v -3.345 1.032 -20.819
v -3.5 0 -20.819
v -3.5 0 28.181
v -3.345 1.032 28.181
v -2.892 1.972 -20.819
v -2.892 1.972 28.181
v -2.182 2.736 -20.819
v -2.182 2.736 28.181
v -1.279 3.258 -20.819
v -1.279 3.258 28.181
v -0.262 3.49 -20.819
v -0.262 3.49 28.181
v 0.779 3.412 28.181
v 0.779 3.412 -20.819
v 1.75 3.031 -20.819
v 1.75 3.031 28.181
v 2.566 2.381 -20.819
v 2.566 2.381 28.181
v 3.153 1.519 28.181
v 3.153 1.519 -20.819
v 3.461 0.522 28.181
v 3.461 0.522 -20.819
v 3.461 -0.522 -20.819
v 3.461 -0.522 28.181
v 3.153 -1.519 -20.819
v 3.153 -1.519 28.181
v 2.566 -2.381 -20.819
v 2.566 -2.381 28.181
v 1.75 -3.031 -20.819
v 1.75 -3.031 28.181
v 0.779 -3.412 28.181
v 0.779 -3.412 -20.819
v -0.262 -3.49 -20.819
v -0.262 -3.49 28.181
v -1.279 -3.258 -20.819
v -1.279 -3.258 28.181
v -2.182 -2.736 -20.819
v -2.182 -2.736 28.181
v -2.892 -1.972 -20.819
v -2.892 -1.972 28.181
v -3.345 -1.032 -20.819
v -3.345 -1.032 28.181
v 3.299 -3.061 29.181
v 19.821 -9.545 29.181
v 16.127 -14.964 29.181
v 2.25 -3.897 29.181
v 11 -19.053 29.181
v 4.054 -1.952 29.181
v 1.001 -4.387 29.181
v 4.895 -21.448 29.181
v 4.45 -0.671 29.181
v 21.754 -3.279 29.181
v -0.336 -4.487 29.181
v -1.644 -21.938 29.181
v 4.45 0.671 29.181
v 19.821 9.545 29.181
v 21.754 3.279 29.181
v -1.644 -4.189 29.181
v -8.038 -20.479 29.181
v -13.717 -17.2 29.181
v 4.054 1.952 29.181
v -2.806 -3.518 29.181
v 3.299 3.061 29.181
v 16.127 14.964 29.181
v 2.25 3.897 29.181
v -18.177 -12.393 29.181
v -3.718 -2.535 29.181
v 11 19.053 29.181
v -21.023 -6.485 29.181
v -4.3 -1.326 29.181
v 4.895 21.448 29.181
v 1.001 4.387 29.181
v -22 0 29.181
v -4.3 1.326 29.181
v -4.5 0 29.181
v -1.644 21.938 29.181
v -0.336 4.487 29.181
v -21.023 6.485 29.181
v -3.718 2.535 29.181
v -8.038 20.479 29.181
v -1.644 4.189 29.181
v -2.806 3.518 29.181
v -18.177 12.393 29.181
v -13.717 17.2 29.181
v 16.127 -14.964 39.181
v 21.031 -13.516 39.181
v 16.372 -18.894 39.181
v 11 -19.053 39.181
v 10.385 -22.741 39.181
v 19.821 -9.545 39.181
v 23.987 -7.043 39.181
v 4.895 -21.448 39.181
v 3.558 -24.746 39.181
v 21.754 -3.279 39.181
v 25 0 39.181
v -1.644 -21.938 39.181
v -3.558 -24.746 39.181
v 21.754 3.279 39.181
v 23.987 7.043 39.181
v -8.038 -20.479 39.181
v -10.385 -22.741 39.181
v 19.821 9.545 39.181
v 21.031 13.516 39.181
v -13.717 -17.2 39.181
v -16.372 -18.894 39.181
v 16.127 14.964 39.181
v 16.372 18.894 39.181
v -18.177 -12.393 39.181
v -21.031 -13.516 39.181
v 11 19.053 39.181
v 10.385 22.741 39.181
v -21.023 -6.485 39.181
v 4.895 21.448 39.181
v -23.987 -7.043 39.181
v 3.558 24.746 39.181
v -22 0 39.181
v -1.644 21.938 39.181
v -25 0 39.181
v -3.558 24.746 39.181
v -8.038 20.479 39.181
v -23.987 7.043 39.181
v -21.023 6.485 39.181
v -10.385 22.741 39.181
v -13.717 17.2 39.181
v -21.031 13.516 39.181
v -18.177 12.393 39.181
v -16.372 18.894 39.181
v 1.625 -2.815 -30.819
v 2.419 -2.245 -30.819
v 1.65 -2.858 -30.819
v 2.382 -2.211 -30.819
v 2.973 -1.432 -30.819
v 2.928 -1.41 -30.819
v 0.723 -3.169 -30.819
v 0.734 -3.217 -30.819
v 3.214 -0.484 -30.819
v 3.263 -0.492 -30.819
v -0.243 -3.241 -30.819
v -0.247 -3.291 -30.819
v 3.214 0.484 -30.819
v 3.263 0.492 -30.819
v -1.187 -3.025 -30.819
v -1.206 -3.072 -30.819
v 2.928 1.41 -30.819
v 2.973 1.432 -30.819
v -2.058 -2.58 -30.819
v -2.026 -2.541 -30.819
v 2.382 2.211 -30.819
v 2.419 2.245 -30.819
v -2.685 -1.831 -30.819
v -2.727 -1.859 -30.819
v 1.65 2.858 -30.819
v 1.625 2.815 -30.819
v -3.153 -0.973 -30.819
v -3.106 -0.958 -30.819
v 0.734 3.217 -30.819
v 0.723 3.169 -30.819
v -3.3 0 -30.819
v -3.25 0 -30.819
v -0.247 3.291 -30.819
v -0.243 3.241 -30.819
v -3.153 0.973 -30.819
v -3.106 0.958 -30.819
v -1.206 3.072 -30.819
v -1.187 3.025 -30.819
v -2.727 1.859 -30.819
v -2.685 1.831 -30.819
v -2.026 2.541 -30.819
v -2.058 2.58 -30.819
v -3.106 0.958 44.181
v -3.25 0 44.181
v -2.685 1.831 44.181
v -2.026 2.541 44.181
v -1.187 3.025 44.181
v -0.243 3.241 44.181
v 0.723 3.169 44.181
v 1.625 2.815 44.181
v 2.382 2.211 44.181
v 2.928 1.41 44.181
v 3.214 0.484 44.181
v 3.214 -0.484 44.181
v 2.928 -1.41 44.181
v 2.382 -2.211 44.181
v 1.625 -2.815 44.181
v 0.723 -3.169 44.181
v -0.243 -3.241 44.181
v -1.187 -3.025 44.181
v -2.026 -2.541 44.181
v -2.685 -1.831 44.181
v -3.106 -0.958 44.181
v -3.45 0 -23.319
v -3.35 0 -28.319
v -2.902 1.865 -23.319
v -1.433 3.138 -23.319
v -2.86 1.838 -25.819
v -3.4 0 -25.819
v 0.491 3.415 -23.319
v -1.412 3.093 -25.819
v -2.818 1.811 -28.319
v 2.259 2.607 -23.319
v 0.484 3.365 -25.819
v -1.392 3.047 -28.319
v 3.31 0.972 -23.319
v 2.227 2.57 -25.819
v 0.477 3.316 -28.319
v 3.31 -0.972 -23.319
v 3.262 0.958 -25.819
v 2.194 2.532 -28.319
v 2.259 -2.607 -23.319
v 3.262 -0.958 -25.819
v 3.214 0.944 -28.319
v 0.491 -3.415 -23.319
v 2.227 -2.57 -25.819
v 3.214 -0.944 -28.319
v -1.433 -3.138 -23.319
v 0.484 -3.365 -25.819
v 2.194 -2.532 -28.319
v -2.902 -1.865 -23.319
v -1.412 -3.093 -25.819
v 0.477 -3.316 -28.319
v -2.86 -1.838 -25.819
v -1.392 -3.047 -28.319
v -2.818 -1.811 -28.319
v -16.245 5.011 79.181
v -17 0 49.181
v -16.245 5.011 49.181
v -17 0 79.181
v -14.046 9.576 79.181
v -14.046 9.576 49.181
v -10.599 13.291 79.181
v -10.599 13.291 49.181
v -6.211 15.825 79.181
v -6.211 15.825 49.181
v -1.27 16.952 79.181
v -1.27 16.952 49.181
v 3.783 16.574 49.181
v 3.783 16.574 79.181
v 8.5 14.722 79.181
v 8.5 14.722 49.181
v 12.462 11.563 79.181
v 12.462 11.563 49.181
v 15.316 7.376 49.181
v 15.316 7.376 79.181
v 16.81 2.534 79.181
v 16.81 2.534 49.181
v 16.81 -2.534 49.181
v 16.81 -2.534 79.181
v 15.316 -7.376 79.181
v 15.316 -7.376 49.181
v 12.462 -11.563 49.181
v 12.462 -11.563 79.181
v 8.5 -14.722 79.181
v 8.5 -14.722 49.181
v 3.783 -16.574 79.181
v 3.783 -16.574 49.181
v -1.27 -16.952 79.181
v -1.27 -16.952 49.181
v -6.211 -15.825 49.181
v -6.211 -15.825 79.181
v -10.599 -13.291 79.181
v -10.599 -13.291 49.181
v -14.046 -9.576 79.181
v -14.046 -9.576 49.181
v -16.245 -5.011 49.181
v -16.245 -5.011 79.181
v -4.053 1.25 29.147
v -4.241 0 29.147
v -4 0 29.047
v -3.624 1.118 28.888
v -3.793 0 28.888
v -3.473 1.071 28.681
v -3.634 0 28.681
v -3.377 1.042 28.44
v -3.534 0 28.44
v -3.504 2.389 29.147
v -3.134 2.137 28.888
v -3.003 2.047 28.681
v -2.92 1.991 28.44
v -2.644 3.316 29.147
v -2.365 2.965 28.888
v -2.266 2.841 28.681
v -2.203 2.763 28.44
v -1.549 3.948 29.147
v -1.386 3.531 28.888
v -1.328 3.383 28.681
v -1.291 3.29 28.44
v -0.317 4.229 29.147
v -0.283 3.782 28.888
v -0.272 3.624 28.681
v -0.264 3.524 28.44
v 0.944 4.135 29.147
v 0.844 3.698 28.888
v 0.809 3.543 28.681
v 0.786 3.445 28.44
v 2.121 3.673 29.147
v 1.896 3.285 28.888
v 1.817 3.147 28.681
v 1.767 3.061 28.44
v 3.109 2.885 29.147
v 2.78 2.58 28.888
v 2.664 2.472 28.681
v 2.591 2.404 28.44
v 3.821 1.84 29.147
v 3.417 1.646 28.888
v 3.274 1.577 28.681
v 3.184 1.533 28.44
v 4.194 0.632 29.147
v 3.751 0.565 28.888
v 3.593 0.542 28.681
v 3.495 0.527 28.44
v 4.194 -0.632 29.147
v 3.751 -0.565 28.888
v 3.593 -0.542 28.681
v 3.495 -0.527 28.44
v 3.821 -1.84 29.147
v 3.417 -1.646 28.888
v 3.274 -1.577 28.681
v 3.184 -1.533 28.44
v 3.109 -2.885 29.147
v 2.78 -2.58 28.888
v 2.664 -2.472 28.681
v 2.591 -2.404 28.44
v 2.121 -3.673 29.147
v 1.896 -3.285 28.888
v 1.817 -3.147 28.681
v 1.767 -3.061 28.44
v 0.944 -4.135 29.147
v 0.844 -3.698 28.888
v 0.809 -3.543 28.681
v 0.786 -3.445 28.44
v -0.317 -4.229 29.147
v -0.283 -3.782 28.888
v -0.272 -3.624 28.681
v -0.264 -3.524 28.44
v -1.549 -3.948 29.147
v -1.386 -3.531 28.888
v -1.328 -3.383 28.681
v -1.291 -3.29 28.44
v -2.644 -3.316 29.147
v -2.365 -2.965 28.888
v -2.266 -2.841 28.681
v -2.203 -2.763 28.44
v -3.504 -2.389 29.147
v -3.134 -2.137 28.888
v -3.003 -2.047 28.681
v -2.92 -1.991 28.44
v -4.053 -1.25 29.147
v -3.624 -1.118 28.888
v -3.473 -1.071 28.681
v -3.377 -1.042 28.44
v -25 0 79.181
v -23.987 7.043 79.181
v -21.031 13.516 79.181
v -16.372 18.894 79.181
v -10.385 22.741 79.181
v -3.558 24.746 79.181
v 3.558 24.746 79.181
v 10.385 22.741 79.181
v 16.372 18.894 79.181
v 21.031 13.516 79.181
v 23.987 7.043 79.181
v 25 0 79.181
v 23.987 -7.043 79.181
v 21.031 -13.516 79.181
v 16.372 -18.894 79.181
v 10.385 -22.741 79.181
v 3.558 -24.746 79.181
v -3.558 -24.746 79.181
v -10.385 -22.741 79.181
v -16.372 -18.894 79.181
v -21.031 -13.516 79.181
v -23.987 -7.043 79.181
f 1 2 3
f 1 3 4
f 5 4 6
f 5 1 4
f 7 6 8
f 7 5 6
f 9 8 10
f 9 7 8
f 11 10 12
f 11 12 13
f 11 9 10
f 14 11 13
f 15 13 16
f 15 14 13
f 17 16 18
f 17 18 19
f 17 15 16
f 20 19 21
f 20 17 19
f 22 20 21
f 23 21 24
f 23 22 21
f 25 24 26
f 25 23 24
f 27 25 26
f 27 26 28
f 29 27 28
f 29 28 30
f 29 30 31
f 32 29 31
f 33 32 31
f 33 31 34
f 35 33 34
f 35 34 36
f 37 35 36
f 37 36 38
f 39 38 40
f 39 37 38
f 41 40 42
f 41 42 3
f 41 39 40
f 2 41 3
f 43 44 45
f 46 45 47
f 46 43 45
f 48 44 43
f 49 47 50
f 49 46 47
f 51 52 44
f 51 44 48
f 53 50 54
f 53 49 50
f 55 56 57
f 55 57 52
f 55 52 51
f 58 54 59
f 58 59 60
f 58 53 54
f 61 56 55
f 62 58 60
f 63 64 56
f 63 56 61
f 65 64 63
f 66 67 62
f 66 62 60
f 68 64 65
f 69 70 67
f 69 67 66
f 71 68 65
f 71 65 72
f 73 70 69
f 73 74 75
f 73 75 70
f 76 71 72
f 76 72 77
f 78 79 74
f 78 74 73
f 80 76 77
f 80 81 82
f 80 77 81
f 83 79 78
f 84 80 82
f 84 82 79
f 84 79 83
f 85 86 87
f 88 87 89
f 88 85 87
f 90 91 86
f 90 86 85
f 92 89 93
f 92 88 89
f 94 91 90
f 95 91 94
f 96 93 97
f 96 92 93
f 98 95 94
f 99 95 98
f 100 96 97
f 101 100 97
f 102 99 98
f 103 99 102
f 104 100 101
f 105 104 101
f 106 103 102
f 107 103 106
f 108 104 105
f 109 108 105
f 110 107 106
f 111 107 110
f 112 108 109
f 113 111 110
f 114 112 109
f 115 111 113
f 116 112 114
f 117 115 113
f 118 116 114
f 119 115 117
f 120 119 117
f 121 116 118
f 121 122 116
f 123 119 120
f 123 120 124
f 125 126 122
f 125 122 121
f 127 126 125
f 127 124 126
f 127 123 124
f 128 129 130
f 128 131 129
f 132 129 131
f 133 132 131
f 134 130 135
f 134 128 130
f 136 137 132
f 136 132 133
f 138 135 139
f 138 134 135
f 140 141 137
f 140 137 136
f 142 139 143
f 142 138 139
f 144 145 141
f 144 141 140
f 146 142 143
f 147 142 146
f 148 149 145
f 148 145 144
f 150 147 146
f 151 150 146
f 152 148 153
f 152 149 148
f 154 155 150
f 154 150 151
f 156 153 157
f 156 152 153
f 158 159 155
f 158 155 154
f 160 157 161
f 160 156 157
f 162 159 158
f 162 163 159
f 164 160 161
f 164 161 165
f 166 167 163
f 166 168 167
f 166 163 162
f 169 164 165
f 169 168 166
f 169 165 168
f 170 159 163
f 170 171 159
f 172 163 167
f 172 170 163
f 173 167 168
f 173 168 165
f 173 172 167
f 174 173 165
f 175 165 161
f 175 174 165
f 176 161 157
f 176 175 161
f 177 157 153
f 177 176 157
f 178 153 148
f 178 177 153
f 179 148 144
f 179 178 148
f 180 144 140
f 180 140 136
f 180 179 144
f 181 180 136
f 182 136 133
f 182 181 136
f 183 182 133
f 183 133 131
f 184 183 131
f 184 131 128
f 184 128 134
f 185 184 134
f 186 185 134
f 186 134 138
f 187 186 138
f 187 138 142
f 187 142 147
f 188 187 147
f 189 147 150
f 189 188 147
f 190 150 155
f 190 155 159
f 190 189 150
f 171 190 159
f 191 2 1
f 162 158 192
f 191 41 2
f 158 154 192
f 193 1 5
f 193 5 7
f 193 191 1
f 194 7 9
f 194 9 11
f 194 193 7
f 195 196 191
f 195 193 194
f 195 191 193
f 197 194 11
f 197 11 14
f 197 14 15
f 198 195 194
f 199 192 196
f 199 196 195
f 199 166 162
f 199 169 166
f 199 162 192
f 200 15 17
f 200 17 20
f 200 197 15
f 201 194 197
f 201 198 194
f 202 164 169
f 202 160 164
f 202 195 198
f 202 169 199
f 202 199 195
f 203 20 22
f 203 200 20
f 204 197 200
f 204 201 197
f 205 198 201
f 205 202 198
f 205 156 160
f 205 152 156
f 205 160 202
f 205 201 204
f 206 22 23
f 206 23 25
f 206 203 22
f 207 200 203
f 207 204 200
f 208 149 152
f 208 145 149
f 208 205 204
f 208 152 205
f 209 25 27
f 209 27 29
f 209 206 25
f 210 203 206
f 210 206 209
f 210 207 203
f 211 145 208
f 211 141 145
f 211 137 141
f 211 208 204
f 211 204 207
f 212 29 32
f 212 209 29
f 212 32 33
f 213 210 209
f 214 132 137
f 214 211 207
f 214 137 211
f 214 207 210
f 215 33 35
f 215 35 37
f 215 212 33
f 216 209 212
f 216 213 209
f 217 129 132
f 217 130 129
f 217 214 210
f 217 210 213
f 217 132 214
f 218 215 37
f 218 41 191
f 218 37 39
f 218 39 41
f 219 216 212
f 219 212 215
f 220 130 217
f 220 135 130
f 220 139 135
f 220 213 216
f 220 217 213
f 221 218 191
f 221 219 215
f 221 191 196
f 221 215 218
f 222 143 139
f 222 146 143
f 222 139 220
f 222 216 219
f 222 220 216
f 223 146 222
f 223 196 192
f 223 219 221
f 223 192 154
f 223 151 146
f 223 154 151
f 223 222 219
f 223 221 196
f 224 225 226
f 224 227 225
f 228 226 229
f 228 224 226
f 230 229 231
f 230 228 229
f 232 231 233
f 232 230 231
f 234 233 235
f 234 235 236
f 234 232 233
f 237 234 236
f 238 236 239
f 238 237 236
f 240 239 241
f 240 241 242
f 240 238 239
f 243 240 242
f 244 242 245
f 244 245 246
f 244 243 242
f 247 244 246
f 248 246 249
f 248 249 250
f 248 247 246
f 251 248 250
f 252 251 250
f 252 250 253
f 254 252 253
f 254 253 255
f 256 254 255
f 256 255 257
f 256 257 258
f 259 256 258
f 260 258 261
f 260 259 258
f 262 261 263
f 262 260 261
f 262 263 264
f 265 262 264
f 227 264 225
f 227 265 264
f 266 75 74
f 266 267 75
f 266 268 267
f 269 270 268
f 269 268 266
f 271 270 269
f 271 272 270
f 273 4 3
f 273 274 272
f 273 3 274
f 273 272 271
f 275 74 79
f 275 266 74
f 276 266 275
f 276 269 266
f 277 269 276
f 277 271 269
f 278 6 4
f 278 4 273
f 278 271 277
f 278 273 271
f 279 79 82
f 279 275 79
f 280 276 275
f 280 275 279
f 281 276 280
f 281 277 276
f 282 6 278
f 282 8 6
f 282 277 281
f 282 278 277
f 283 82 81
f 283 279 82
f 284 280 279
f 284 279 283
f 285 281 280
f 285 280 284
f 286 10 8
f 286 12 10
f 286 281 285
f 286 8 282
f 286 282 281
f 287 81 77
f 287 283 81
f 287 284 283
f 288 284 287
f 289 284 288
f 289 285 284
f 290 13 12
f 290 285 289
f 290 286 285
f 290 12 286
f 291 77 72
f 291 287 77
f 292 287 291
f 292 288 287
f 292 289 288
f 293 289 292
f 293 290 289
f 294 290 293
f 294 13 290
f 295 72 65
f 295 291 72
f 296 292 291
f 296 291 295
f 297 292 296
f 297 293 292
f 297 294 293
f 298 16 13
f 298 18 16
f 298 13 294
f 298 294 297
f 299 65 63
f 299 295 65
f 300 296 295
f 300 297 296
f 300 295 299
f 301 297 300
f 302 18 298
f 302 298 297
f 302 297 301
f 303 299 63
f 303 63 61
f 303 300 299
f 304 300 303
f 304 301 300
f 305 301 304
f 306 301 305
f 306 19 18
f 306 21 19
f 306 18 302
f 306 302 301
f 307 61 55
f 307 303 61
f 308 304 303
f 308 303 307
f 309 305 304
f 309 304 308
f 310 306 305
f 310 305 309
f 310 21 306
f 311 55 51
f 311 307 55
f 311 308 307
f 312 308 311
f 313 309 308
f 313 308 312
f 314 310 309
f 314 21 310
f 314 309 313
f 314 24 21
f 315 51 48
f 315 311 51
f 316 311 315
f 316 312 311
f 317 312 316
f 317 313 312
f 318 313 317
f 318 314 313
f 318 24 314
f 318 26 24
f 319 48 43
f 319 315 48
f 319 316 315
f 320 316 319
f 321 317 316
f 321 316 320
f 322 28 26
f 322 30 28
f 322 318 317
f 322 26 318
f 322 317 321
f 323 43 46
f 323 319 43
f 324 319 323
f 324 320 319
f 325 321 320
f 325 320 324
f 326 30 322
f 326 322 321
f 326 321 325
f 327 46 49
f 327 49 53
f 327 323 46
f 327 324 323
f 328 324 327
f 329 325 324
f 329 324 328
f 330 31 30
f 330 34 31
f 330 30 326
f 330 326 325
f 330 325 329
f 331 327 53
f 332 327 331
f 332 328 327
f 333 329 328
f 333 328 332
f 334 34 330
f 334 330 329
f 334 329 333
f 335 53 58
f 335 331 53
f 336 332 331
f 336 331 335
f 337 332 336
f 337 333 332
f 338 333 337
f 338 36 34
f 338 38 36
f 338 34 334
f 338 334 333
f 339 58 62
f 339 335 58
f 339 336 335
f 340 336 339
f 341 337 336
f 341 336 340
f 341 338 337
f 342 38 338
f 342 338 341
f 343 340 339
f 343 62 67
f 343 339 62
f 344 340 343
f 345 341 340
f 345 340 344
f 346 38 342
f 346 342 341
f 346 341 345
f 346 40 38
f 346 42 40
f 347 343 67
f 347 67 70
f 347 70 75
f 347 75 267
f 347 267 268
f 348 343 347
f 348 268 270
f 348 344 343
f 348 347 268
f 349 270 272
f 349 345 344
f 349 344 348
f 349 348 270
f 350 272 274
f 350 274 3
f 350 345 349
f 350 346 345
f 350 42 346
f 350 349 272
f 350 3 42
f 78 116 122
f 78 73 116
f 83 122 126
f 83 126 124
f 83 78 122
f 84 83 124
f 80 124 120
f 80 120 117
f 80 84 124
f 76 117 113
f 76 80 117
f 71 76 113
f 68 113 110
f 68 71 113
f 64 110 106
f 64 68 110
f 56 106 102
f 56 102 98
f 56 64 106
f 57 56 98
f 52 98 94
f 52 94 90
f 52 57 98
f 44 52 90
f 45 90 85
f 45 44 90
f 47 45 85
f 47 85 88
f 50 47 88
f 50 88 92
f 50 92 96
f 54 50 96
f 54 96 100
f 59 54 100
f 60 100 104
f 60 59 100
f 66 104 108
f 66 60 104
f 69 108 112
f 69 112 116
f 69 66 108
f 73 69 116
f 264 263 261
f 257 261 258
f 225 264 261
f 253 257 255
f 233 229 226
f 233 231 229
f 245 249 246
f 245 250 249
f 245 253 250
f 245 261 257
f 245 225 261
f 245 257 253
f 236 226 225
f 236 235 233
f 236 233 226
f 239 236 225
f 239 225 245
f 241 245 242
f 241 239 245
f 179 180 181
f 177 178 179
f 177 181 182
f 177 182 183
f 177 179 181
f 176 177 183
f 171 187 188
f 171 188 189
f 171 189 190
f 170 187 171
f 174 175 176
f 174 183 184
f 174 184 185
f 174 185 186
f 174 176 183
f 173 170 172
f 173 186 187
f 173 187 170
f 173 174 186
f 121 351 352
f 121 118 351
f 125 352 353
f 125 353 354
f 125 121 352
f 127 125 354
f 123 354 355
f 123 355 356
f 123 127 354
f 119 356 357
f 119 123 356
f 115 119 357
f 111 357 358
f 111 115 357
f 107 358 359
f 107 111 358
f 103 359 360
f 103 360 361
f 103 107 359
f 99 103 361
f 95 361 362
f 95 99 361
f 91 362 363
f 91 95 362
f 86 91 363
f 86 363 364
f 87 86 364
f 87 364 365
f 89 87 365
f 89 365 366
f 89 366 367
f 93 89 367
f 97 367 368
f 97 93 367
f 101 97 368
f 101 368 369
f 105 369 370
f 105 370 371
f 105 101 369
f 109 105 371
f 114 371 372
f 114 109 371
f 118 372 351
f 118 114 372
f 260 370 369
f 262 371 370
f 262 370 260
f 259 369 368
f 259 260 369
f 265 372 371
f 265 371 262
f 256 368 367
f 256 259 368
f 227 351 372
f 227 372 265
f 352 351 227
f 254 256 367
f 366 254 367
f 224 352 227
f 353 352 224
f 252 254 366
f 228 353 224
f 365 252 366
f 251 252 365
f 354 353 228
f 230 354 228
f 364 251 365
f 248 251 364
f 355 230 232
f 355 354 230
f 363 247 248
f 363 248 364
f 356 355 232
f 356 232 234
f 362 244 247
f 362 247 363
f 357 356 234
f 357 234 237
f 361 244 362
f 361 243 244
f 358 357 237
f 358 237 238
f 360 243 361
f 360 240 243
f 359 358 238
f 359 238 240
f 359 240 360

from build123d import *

# Parameters (mm, degrees)
F2_SIZE2 = 0.2
F2_SIZE  = 10


with BuildPart() as f1:
    # F0 (on Front) → F1 (revolve)
    with BuildSketch(Plane.XZ):
        with BuildLine():
            Line((0, 44.181132), (0, 49.181134))
            Line((0, 49.181134), (-17, 49.181134))
            Line((-17, 49.181134), (-17, 79.181135))
            Line((-17, 79.181135), (-25, 79.181135))
            Line((-25, 79.181135), (-25, 39.181132))
            Line((-25, 39.181132), (-22, 39.181132))
            Line((-22, 39.181132), (-22, 29.181132))
            Line((-22, 29.181132), (-4.5, 29.181132))
            ThreePointArc((-4.5, 29.181132), (-3.792893, 28.888239), (-3.5, 28.181132))
            Line((-3.5, 28.181132), (-3.5, -30.818868))
            Line((-3.5, -30.818868), (-3.25, -30.818868))
            Line((-3.25, -30.818868), (-3.25, 44.181132))
            Line((-3.25, 44.181132), (0, 44.181132))
        make_face()
    revolve(axis=Axis((0, 0, 1.49861), (0, 0, -1)))

    # F2
    f2_edges = [f1.edges().sort_by_distance(p)[0] for p in [
        (3.5, 0, -30.818868),
    ]]
    chamfer(f2_edges, length=F2_SIZE, length2=F2_SIZE2)


solid = f1.part
